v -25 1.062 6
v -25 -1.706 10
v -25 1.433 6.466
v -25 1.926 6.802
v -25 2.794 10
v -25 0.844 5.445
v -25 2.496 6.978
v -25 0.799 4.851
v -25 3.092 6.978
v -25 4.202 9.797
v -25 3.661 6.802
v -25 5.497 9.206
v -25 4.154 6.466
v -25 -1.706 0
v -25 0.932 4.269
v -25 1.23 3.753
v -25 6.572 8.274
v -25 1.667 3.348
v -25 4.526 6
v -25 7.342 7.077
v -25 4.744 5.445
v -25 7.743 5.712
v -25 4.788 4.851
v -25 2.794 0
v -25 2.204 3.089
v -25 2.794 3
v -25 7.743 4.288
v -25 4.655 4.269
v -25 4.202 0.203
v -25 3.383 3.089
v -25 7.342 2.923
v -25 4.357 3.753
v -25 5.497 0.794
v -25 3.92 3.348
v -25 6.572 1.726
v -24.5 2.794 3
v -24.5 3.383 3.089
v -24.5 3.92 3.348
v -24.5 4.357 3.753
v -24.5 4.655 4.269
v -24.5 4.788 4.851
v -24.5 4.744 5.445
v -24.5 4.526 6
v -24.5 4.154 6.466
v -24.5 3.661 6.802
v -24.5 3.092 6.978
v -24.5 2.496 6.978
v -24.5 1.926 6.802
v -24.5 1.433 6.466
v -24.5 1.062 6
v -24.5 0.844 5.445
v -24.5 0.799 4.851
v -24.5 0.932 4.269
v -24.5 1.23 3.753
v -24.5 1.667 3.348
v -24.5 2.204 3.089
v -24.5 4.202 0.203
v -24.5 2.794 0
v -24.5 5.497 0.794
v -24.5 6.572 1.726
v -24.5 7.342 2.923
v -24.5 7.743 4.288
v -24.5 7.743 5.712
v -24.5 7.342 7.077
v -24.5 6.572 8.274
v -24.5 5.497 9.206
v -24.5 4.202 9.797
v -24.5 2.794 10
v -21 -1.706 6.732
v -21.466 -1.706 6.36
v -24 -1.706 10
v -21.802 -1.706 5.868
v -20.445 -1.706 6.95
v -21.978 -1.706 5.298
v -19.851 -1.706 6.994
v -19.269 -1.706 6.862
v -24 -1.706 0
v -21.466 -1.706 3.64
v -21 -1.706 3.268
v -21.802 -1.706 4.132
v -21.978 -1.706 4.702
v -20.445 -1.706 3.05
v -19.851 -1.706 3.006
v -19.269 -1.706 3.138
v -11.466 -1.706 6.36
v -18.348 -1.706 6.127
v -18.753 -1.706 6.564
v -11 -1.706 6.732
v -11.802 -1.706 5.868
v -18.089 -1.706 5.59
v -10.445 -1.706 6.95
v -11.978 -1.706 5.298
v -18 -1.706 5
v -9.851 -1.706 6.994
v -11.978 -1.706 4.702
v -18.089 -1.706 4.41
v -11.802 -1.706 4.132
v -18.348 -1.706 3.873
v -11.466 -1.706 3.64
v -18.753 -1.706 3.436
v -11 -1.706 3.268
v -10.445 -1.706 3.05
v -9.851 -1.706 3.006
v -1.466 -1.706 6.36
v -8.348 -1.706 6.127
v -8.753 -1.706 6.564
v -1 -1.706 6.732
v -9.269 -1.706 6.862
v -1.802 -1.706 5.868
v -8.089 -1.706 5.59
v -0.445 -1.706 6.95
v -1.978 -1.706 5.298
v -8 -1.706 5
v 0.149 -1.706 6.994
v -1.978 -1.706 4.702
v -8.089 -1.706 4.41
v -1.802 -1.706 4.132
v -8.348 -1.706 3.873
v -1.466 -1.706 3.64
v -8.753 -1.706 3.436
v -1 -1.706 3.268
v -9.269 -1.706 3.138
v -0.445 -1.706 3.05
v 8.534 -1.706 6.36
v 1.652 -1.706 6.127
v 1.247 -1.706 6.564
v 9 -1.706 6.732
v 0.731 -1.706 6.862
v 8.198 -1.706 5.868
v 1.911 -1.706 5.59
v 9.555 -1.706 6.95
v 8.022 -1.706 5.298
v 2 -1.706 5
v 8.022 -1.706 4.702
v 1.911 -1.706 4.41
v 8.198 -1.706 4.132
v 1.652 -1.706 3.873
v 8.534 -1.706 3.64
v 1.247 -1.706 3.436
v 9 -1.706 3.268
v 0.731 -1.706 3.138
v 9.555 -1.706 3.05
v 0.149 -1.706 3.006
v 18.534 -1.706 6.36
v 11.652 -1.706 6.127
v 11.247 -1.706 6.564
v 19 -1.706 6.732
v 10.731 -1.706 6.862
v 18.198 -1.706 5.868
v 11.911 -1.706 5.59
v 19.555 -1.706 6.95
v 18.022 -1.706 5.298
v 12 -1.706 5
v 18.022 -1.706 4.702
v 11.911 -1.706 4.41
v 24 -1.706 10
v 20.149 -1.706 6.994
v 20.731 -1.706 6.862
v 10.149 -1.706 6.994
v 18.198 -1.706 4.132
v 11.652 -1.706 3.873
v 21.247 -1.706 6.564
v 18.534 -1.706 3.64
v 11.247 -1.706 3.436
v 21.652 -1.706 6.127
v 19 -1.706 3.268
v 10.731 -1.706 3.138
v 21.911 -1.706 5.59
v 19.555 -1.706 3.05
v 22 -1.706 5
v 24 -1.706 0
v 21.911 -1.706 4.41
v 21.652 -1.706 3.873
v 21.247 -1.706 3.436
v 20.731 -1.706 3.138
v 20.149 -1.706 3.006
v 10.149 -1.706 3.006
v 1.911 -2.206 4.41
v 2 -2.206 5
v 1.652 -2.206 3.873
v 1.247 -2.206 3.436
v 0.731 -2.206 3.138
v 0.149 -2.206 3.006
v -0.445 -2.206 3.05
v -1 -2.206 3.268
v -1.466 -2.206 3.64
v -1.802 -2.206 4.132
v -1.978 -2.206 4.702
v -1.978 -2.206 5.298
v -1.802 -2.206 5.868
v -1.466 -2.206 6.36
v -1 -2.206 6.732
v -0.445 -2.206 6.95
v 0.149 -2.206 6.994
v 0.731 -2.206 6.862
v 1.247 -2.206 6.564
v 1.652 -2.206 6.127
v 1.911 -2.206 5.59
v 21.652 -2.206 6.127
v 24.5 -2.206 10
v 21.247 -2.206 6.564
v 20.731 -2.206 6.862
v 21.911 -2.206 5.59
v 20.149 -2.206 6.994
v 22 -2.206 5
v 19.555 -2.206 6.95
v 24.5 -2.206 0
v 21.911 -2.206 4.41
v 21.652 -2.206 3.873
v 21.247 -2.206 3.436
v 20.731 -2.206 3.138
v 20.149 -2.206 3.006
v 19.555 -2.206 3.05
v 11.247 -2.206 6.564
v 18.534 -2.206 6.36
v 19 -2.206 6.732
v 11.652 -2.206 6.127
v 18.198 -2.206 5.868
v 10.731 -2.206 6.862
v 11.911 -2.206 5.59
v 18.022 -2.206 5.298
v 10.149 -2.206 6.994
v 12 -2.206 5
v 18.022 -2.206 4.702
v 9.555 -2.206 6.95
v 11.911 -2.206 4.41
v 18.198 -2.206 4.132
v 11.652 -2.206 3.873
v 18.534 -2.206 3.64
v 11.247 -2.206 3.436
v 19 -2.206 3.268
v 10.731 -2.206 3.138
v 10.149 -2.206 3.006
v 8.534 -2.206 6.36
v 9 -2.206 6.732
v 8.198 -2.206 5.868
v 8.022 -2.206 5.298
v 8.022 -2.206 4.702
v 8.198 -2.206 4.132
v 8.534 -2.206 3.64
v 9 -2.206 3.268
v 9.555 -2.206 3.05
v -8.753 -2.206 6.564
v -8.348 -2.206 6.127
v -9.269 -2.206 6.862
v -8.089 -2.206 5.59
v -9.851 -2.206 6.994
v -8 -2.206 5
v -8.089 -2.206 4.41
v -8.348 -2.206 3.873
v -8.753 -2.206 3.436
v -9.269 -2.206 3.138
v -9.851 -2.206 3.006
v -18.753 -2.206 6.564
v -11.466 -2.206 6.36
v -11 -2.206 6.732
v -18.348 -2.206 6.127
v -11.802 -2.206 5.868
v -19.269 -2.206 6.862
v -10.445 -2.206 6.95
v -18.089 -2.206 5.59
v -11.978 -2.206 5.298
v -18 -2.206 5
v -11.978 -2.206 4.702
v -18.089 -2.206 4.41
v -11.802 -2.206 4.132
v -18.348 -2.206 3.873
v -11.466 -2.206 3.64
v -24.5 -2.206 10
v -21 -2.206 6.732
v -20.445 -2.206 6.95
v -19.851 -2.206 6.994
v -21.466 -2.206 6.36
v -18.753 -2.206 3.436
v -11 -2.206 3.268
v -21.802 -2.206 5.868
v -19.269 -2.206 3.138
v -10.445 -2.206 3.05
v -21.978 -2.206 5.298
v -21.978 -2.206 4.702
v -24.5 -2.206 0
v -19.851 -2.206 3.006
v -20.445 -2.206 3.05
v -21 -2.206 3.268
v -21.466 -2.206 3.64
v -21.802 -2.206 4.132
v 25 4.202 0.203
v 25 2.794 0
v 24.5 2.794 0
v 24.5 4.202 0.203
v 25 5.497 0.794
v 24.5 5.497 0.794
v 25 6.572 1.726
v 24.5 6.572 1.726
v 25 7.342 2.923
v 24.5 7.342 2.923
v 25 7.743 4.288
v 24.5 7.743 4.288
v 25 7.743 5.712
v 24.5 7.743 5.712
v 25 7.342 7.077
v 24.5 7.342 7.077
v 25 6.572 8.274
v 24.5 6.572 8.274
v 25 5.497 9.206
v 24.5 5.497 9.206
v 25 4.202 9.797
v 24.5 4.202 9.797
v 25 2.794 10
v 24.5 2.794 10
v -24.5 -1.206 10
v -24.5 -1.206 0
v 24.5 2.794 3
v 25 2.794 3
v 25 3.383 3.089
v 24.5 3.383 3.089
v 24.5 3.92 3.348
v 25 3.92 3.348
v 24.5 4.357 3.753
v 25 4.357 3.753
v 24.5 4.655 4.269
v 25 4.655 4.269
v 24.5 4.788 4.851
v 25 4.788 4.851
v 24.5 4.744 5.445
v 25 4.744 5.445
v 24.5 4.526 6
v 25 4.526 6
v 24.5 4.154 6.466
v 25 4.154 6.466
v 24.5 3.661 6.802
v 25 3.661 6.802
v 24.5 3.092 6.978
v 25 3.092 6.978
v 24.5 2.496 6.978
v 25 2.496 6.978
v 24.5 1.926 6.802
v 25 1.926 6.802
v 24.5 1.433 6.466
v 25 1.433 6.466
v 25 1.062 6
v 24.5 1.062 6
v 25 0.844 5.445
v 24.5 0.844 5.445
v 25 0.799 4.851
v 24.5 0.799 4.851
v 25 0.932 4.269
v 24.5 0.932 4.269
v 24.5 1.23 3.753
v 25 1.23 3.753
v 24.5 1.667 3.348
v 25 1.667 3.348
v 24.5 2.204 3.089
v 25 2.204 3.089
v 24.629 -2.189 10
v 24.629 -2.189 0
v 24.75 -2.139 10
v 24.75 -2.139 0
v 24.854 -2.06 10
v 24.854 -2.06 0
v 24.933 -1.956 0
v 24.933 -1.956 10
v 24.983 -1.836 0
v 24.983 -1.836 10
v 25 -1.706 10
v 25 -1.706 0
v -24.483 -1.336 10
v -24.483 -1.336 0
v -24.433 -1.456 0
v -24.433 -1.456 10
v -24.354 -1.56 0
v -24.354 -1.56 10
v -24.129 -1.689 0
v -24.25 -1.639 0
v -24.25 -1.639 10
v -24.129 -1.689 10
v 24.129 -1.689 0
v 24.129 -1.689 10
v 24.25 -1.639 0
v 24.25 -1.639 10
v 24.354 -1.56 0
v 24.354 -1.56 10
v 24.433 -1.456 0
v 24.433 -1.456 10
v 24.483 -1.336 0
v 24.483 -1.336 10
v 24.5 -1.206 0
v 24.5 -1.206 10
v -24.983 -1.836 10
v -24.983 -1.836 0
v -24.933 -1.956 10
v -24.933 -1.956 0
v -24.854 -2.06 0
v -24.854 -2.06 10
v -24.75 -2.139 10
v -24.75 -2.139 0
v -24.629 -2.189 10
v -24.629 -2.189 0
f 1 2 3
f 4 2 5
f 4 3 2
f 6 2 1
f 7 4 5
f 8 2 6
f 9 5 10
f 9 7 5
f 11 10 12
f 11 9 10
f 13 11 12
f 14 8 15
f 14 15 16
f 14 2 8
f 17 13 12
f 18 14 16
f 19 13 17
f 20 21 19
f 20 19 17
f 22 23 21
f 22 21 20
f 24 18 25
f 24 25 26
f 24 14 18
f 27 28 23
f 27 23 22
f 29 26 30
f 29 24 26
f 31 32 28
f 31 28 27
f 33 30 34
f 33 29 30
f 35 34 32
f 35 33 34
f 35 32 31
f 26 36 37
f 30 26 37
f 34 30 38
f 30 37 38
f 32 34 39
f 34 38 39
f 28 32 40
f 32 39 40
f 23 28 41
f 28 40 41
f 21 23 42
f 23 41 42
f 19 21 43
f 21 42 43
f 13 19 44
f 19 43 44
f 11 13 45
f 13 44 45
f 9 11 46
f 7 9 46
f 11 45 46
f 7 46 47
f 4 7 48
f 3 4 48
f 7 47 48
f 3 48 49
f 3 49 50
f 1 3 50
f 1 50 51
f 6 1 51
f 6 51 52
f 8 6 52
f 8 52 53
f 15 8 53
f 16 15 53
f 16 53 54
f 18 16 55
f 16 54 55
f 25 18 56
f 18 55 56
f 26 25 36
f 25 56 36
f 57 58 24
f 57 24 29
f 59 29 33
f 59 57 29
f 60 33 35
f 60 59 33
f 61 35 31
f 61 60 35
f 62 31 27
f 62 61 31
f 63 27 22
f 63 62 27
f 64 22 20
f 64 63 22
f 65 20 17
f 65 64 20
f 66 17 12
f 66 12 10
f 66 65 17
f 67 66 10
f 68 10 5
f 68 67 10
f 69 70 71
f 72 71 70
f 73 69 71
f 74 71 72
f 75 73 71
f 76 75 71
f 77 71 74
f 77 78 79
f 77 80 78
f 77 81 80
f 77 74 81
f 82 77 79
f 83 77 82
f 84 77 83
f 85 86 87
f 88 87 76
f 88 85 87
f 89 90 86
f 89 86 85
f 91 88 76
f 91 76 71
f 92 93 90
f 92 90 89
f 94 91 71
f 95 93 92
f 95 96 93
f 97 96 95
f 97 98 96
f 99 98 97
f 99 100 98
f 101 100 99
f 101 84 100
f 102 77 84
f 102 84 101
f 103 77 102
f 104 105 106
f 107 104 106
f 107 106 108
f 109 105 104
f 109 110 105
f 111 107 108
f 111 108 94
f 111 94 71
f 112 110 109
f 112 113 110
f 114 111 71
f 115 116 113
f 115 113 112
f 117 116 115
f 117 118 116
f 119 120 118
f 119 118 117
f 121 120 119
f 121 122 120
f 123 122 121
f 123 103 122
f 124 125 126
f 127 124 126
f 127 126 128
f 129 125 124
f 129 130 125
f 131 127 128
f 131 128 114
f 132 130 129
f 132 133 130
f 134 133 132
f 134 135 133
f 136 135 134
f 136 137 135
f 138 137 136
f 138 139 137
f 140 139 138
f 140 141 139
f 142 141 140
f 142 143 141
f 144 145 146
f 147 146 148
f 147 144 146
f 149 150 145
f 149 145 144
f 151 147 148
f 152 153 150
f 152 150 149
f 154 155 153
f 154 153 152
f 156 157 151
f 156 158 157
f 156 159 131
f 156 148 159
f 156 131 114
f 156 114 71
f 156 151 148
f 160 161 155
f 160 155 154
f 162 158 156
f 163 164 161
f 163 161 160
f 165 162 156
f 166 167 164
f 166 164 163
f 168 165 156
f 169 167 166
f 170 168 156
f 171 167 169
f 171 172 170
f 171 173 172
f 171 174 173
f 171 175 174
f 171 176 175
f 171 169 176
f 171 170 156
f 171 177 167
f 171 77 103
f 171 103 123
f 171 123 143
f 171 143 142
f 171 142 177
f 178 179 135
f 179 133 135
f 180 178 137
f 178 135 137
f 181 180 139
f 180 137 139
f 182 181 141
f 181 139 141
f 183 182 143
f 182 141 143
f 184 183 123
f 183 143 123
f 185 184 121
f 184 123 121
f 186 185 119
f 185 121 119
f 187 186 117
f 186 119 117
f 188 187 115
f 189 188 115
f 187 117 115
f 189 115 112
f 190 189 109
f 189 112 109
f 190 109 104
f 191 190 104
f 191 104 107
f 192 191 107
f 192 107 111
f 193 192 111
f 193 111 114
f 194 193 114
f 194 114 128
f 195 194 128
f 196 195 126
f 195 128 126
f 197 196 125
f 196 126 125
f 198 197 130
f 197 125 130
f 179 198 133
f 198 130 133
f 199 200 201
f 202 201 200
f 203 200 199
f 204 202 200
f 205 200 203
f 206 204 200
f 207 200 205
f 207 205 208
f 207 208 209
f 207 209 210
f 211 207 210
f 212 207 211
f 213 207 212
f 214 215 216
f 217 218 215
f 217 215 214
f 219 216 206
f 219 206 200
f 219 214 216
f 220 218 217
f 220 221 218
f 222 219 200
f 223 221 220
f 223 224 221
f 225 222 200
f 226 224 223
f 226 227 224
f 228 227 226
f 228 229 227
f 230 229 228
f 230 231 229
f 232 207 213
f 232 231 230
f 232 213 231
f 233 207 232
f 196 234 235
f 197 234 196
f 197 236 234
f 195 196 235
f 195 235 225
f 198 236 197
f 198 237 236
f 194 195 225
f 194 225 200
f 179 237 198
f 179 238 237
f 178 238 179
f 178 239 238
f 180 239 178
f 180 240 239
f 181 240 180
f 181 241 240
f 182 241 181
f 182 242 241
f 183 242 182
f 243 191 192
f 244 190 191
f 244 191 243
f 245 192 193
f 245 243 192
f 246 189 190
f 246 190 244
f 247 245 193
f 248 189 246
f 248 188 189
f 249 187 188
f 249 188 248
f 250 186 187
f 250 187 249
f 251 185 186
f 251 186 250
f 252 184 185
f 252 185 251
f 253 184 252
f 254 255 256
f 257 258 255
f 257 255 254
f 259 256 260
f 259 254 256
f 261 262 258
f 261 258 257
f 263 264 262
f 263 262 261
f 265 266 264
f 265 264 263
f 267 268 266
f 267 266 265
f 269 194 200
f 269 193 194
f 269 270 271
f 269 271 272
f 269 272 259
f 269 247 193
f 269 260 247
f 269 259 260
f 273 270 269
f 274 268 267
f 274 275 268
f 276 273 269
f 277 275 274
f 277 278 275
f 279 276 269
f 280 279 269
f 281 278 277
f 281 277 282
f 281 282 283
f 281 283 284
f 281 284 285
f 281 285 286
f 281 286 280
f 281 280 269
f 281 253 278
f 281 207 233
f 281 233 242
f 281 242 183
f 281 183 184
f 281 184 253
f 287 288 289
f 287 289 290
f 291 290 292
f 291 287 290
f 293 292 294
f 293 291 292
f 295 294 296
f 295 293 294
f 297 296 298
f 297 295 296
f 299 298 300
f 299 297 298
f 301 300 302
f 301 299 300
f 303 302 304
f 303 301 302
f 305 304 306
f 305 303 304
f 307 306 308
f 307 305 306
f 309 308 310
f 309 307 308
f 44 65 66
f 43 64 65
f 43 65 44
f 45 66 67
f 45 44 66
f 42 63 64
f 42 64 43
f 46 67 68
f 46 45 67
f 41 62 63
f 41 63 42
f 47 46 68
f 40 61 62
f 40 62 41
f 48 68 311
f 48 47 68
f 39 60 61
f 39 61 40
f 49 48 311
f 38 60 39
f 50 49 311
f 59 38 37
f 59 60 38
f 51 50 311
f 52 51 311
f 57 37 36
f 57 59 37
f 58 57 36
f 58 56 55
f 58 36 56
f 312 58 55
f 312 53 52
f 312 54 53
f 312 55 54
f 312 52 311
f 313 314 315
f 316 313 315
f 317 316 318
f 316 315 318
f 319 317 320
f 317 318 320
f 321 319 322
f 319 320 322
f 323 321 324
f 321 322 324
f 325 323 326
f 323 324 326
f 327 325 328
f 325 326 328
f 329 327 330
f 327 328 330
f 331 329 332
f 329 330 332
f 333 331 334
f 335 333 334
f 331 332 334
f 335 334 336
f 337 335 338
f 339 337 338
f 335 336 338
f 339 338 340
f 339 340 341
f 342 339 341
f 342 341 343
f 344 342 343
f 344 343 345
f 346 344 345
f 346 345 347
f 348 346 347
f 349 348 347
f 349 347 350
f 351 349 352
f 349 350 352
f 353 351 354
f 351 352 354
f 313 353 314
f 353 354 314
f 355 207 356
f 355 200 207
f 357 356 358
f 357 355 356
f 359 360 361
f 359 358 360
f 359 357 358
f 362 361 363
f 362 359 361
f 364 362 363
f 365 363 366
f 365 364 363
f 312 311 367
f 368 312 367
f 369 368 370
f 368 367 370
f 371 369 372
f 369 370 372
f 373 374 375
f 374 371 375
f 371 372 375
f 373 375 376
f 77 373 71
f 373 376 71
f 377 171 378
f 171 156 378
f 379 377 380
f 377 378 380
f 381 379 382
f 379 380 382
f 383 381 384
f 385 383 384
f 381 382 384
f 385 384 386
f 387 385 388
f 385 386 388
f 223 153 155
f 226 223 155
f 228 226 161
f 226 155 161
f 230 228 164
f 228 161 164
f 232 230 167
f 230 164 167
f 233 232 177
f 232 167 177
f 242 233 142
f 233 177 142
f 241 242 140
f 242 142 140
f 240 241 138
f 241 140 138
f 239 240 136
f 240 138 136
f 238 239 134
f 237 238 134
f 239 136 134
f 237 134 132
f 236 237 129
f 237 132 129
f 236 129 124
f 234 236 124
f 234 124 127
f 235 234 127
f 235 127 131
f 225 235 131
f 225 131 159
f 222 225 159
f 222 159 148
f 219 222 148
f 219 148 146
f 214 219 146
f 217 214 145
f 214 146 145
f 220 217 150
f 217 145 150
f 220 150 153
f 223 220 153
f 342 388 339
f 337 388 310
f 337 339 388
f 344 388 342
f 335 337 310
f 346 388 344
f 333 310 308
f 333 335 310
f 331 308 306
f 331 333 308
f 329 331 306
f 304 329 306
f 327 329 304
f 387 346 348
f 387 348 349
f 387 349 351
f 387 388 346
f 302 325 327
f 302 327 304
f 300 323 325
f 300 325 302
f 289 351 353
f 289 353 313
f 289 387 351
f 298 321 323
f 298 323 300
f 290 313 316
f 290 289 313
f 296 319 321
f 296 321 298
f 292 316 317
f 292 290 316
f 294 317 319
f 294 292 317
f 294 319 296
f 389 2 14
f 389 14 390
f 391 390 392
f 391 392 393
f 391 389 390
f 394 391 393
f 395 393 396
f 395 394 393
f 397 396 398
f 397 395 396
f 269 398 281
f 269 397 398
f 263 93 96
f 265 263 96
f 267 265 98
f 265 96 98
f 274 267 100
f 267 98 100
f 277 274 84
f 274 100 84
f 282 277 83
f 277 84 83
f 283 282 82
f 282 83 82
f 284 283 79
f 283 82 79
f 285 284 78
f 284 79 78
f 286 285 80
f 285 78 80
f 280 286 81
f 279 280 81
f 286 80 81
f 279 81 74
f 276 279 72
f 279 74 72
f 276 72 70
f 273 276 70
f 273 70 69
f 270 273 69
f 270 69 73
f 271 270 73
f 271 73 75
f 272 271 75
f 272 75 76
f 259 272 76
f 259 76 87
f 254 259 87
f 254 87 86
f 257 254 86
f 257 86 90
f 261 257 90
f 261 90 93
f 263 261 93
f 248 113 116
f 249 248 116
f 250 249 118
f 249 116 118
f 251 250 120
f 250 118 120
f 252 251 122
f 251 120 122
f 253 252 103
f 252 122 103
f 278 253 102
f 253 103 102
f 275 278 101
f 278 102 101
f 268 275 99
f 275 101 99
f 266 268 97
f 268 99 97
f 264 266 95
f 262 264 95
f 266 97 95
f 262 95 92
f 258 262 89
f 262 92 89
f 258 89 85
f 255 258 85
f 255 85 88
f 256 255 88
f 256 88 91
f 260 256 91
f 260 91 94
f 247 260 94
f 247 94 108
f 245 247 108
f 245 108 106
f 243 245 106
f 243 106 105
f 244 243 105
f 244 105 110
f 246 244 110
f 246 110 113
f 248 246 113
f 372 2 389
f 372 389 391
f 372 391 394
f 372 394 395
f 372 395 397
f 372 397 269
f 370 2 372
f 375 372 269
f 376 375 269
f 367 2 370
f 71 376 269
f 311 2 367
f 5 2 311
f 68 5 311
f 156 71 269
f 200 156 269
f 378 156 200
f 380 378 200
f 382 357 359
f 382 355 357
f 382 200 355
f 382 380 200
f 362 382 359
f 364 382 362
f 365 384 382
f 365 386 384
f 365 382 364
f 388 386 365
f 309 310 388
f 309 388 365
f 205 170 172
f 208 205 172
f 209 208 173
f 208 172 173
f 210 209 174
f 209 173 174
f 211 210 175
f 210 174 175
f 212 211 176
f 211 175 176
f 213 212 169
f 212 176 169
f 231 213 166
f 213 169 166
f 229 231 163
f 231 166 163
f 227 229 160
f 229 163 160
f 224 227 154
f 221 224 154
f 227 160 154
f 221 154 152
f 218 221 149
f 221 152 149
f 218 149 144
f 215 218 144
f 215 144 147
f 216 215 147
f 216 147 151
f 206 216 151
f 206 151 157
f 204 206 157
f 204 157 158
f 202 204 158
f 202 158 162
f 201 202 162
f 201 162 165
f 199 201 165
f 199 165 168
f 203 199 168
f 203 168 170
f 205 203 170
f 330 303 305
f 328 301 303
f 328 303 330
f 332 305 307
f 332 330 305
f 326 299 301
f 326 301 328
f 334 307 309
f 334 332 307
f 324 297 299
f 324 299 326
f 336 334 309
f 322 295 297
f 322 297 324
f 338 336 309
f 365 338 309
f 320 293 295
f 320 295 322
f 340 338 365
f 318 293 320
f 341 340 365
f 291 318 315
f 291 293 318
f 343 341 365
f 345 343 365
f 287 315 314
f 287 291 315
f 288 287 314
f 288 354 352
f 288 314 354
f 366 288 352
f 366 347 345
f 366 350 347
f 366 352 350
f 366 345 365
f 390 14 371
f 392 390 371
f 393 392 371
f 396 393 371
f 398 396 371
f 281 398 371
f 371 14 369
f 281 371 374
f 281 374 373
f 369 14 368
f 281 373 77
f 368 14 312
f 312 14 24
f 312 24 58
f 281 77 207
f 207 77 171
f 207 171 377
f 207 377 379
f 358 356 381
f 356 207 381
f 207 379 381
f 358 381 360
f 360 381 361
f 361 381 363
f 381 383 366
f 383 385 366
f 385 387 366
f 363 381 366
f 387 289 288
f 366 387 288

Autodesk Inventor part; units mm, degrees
ref_plane "YZ Plane" through (0, 0, 0) normal (1, 0, 0) x (0, 1, 0)
ref_plane "XZ Plane" through (0, 0, 0) normal (0, 1, 0) x (-1, 0, 0)
ref_plane "XY Plane" through (0, 0, 0) normal (0, 0, 1) x (1, 0, 0)
sketch "Náčrt1" plane through (0, 0, 0) normal (0, 0, 1) x (1, 0, 0)
  line L0 (-24.5, 7.7937) -> (-24.5, -1.7063)
  line L1 (-24.5, -1.7063) -> (24.5, -1.7063)
  line L2 (24.5, -1.7063) -> (24.5, 7.7937)
  line L3 (24.5, 7.7937) -> (25, 7.7937)
  line L4 (25, 7.7937) -> (25, -2.2063)
  line L5 (25, -2.2063) -> (-25, -2.2063)
  line L6 (-25, -2.2063) -> (-25, 7.7937)
  line L7 (-25, 7.7937) -> (-24.5, 7.7937)
  point P0 (0, 0)
  point P1 (24.5, 3.0437)
  point P2 (-24.75, 7.7937)
  point P3 (24.75, 7.7937)
  dimension "d0" = 25
  dimension "d1" = 25
  dimension "d2" = 0.5
  dimension "d3" = 0.5
  dimension "d4" = 0.5
  dimension "d5" = 10
  dimension "d6" = 10
extrude "Vysunutí1" add sketch "Náčrt1" along normal blind 10
sketch "Náčrt2" plane through (25, -2.2063, 0) normal (1, 0, 0) x (0, 0, -1)
  circle A0 centre (-5, 5) radius 2
  line L0 (0, 0) -> (0, 10) projected
  point P0 (0, 2.2063)
  point P1 (0, 5)
  dimension "d9" = 4
  dimension "d10" = 5
extrude "Vysunutí2" cut sketch "Náčrt2" against normal through all
pattern_linear "Obdélníkové pole1" count 10 spacing 10 along (0, 0, 1) of "Vysunutí2"
sketch "Náčrt3" plane through (-24.5, -1.7063, 0) normal (0, 1, 0) x (1, 0, 0)
  circle A0 centre (4.5, -5) radius 2
  line L0 (49, -10) -> (0, -10) projected
  line L1 (-0.5, 0) -> (-0.5, -10) projected
  point P0 (24.5, 0)
  dimension "d16" = 4
  dimension "d17" = 5
  dimension "d18" = 5
extrude "Vysunutí3" cut sketch "Náčrt3" against normal through all
pattern_linear "Obdélníkové pole2" count 10 spacing 10 along (0, 0, -1) count 5 spacing 10 along (1, 0, 0) of "Vysunutí3"
sketch "Náčrt4" plane through (25, -2.2063, 0) normal (1, 0, 0) x (0, 0, -1)
  arc A0 (0, 5) -> (-10, 5) centre (-5, 5) ccw
  line L0 (0, 0) -> (0, 10) projected
  line L1 (0, 0) -> (-10, 0) projected
  line L2 (0, 10) -> (-10, 10) projected
  line L3 (-10, 10) -> (0, 10)
  line L4 (0, 10) -> (0, 5)
  line L5 (0, 10) -> (0, 0.5) projected
  line L6 (-10, 10) -> (-10, 0.5) projected
  line L7 (-10, 5) -> (-10, 10)
  point P0 (0, 2.2063)
  point P1 (-5, 10)
  dimension "d27" = 10
  dimension "d28" = 5
  dimension "d29" = 5
extrude "Vysunutí4" cut sketch "Náčrt4" against normal through all
fillet "Zaoblení1" radius 0.5 2 edges at (25, -2.2063, 5) (24.5, -1.7063, 5)
fillet "Zaoblení2" radius 0.5 2 edges at (-25, -2.2063, 5) (-24.5, -1.7063, 5)
properties part number "1031"
